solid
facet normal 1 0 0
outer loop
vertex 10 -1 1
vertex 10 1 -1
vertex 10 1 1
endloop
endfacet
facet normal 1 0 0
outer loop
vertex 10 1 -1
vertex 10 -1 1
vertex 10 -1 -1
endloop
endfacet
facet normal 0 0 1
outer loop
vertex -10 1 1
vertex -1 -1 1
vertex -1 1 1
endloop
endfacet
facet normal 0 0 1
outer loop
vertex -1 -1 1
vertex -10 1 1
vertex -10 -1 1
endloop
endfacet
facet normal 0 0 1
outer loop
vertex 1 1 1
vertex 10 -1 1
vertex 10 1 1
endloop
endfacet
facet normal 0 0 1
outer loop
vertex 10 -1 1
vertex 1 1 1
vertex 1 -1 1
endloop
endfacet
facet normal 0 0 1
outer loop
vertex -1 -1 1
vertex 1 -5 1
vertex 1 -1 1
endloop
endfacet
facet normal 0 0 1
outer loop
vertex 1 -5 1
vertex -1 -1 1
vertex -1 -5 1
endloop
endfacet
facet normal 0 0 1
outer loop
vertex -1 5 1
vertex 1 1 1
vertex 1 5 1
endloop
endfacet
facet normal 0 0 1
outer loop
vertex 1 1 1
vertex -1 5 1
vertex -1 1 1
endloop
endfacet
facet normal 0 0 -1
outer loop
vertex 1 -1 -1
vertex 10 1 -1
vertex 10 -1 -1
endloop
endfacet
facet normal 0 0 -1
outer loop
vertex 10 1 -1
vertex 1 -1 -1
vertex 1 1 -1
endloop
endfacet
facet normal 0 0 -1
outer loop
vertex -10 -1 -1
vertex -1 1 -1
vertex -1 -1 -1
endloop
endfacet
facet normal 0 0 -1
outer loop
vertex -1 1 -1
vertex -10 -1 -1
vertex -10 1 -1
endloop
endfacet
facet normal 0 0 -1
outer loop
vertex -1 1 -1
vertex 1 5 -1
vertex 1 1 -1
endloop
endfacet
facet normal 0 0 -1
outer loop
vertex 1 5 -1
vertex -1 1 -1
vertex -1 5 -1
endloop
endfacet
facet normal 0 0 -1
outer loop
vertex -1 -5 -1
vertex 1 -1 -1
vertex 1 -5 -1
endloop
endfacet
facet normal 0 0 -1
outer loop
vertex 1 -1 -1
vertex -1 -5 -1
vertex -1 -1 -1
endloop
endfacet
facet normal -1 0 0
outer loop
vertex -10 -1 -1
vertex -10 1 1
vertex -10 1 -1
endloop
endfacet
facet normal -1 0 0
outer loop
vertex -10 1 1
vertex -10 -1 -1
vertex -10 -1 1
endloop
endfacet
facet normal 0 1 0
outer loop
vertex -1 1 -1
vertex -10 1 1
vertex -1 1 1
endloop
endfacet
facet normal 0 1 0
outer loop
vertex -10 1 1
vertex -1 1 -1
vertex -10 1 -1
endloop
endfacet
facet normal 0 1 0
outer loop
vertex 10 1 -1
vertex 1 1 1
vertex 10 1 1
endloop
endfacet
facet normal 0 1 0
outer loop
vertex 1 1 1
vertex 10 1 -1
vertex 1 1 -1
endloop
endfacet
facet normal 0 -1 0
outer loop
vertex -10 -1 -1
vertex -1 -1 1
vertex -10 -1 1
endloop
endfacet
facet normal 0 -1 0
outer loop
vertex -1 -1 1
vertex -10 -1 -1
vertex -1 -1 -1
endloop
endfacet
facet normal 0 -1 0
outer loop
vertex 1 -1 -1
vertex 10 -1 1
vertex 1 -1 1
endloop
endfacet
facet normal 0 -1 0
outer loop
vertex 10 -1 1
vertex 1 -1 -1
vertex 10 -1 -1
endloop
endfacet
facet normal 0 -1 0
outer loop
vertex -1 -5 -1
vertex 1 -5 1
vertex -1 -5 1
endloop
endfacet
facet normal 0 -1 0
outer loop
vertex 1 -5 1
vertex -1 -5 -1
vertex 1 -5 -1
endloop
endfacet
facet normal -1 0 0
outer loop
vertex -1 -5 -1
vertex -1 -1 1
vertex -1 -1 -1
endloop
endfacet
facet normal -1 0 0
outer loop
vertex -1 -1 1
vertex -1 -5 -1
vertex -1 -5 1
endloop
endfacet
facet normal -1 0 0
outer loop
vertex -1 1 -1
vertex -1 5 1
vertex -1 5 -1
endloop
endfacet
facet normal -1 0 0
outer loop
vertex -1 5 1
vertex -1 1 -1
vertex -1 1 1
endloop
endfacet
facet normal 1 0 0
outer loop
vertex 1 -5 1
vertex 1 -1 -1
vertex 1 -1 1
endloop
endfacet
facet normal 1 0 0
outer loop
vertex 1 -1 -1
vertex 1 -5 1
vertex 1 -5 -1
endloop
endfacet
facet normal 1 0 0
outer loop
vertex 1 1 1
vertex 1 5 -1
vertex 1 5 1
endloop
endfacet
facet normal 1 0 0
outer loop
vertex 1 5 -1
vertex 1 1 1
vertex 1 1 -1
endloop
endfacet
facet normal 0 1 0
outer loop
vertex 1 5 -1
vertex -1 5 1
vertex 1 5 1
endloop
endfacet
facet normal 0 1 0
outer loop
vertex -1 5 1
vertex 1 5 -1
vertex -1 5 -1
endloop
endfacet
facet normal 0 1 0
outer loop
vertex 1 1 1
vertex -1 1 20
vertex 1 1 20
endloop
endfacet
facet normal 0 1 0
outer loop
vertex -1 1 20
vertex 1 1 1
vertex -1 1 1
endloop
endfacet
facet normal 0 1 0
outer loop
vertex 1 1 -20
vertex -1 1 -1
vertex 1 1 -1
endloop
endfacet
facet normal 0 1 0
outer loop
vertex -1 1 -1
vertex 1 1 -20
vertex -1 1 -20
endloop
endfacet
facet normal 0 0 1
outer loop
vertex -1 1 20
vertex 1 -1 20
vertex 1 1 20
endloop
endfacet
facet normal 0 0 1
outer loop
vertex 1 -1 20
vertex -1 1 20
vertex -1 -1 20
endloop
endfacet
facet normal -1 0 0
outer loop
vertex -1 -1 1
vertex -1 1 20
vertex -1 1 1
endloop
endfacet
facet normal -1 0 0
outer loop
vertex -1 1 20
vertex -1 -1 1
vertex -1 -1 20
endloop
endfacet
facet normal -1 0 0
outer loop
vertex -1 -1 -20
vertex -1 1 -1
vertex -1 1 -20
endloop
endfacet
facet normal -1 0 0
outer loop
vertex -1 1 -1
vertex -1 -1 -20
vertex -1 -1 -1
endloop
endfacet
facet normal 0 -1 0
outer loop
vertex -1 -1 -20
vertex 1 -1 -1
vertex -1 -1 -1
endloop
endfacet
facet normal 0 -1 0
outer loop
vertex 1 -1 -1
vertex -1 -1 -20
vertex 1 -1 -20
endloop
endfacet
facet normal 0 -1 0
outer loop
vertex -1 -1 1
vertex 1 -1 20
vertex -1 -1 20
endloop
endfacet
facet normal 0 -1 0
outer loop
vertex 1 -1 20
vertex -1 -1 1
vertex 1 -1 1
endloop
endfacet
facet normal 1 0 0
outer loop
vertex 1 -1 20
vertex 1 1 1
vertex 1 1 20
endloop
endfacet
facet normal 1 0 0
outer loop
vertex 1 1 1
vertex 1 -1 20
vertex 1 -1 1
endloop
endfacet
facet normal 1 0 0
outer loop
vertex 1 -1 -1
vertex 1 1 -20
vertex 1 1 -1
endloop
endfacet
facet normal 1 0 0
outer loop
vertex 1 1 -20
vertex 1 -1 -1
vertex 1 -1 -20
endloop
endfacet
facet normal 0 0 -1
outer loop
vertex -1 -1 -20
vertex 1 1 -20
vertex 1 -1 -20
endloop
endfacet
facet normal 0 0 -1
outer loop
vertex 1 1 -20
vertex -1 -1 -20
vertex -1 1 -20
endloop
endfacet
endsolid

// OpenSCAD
cube([20,2,2],true);

rotate([0,0,90])
cube([10,2,2],true);

rotate([0,90,90])
cube([40,2,2],true);
